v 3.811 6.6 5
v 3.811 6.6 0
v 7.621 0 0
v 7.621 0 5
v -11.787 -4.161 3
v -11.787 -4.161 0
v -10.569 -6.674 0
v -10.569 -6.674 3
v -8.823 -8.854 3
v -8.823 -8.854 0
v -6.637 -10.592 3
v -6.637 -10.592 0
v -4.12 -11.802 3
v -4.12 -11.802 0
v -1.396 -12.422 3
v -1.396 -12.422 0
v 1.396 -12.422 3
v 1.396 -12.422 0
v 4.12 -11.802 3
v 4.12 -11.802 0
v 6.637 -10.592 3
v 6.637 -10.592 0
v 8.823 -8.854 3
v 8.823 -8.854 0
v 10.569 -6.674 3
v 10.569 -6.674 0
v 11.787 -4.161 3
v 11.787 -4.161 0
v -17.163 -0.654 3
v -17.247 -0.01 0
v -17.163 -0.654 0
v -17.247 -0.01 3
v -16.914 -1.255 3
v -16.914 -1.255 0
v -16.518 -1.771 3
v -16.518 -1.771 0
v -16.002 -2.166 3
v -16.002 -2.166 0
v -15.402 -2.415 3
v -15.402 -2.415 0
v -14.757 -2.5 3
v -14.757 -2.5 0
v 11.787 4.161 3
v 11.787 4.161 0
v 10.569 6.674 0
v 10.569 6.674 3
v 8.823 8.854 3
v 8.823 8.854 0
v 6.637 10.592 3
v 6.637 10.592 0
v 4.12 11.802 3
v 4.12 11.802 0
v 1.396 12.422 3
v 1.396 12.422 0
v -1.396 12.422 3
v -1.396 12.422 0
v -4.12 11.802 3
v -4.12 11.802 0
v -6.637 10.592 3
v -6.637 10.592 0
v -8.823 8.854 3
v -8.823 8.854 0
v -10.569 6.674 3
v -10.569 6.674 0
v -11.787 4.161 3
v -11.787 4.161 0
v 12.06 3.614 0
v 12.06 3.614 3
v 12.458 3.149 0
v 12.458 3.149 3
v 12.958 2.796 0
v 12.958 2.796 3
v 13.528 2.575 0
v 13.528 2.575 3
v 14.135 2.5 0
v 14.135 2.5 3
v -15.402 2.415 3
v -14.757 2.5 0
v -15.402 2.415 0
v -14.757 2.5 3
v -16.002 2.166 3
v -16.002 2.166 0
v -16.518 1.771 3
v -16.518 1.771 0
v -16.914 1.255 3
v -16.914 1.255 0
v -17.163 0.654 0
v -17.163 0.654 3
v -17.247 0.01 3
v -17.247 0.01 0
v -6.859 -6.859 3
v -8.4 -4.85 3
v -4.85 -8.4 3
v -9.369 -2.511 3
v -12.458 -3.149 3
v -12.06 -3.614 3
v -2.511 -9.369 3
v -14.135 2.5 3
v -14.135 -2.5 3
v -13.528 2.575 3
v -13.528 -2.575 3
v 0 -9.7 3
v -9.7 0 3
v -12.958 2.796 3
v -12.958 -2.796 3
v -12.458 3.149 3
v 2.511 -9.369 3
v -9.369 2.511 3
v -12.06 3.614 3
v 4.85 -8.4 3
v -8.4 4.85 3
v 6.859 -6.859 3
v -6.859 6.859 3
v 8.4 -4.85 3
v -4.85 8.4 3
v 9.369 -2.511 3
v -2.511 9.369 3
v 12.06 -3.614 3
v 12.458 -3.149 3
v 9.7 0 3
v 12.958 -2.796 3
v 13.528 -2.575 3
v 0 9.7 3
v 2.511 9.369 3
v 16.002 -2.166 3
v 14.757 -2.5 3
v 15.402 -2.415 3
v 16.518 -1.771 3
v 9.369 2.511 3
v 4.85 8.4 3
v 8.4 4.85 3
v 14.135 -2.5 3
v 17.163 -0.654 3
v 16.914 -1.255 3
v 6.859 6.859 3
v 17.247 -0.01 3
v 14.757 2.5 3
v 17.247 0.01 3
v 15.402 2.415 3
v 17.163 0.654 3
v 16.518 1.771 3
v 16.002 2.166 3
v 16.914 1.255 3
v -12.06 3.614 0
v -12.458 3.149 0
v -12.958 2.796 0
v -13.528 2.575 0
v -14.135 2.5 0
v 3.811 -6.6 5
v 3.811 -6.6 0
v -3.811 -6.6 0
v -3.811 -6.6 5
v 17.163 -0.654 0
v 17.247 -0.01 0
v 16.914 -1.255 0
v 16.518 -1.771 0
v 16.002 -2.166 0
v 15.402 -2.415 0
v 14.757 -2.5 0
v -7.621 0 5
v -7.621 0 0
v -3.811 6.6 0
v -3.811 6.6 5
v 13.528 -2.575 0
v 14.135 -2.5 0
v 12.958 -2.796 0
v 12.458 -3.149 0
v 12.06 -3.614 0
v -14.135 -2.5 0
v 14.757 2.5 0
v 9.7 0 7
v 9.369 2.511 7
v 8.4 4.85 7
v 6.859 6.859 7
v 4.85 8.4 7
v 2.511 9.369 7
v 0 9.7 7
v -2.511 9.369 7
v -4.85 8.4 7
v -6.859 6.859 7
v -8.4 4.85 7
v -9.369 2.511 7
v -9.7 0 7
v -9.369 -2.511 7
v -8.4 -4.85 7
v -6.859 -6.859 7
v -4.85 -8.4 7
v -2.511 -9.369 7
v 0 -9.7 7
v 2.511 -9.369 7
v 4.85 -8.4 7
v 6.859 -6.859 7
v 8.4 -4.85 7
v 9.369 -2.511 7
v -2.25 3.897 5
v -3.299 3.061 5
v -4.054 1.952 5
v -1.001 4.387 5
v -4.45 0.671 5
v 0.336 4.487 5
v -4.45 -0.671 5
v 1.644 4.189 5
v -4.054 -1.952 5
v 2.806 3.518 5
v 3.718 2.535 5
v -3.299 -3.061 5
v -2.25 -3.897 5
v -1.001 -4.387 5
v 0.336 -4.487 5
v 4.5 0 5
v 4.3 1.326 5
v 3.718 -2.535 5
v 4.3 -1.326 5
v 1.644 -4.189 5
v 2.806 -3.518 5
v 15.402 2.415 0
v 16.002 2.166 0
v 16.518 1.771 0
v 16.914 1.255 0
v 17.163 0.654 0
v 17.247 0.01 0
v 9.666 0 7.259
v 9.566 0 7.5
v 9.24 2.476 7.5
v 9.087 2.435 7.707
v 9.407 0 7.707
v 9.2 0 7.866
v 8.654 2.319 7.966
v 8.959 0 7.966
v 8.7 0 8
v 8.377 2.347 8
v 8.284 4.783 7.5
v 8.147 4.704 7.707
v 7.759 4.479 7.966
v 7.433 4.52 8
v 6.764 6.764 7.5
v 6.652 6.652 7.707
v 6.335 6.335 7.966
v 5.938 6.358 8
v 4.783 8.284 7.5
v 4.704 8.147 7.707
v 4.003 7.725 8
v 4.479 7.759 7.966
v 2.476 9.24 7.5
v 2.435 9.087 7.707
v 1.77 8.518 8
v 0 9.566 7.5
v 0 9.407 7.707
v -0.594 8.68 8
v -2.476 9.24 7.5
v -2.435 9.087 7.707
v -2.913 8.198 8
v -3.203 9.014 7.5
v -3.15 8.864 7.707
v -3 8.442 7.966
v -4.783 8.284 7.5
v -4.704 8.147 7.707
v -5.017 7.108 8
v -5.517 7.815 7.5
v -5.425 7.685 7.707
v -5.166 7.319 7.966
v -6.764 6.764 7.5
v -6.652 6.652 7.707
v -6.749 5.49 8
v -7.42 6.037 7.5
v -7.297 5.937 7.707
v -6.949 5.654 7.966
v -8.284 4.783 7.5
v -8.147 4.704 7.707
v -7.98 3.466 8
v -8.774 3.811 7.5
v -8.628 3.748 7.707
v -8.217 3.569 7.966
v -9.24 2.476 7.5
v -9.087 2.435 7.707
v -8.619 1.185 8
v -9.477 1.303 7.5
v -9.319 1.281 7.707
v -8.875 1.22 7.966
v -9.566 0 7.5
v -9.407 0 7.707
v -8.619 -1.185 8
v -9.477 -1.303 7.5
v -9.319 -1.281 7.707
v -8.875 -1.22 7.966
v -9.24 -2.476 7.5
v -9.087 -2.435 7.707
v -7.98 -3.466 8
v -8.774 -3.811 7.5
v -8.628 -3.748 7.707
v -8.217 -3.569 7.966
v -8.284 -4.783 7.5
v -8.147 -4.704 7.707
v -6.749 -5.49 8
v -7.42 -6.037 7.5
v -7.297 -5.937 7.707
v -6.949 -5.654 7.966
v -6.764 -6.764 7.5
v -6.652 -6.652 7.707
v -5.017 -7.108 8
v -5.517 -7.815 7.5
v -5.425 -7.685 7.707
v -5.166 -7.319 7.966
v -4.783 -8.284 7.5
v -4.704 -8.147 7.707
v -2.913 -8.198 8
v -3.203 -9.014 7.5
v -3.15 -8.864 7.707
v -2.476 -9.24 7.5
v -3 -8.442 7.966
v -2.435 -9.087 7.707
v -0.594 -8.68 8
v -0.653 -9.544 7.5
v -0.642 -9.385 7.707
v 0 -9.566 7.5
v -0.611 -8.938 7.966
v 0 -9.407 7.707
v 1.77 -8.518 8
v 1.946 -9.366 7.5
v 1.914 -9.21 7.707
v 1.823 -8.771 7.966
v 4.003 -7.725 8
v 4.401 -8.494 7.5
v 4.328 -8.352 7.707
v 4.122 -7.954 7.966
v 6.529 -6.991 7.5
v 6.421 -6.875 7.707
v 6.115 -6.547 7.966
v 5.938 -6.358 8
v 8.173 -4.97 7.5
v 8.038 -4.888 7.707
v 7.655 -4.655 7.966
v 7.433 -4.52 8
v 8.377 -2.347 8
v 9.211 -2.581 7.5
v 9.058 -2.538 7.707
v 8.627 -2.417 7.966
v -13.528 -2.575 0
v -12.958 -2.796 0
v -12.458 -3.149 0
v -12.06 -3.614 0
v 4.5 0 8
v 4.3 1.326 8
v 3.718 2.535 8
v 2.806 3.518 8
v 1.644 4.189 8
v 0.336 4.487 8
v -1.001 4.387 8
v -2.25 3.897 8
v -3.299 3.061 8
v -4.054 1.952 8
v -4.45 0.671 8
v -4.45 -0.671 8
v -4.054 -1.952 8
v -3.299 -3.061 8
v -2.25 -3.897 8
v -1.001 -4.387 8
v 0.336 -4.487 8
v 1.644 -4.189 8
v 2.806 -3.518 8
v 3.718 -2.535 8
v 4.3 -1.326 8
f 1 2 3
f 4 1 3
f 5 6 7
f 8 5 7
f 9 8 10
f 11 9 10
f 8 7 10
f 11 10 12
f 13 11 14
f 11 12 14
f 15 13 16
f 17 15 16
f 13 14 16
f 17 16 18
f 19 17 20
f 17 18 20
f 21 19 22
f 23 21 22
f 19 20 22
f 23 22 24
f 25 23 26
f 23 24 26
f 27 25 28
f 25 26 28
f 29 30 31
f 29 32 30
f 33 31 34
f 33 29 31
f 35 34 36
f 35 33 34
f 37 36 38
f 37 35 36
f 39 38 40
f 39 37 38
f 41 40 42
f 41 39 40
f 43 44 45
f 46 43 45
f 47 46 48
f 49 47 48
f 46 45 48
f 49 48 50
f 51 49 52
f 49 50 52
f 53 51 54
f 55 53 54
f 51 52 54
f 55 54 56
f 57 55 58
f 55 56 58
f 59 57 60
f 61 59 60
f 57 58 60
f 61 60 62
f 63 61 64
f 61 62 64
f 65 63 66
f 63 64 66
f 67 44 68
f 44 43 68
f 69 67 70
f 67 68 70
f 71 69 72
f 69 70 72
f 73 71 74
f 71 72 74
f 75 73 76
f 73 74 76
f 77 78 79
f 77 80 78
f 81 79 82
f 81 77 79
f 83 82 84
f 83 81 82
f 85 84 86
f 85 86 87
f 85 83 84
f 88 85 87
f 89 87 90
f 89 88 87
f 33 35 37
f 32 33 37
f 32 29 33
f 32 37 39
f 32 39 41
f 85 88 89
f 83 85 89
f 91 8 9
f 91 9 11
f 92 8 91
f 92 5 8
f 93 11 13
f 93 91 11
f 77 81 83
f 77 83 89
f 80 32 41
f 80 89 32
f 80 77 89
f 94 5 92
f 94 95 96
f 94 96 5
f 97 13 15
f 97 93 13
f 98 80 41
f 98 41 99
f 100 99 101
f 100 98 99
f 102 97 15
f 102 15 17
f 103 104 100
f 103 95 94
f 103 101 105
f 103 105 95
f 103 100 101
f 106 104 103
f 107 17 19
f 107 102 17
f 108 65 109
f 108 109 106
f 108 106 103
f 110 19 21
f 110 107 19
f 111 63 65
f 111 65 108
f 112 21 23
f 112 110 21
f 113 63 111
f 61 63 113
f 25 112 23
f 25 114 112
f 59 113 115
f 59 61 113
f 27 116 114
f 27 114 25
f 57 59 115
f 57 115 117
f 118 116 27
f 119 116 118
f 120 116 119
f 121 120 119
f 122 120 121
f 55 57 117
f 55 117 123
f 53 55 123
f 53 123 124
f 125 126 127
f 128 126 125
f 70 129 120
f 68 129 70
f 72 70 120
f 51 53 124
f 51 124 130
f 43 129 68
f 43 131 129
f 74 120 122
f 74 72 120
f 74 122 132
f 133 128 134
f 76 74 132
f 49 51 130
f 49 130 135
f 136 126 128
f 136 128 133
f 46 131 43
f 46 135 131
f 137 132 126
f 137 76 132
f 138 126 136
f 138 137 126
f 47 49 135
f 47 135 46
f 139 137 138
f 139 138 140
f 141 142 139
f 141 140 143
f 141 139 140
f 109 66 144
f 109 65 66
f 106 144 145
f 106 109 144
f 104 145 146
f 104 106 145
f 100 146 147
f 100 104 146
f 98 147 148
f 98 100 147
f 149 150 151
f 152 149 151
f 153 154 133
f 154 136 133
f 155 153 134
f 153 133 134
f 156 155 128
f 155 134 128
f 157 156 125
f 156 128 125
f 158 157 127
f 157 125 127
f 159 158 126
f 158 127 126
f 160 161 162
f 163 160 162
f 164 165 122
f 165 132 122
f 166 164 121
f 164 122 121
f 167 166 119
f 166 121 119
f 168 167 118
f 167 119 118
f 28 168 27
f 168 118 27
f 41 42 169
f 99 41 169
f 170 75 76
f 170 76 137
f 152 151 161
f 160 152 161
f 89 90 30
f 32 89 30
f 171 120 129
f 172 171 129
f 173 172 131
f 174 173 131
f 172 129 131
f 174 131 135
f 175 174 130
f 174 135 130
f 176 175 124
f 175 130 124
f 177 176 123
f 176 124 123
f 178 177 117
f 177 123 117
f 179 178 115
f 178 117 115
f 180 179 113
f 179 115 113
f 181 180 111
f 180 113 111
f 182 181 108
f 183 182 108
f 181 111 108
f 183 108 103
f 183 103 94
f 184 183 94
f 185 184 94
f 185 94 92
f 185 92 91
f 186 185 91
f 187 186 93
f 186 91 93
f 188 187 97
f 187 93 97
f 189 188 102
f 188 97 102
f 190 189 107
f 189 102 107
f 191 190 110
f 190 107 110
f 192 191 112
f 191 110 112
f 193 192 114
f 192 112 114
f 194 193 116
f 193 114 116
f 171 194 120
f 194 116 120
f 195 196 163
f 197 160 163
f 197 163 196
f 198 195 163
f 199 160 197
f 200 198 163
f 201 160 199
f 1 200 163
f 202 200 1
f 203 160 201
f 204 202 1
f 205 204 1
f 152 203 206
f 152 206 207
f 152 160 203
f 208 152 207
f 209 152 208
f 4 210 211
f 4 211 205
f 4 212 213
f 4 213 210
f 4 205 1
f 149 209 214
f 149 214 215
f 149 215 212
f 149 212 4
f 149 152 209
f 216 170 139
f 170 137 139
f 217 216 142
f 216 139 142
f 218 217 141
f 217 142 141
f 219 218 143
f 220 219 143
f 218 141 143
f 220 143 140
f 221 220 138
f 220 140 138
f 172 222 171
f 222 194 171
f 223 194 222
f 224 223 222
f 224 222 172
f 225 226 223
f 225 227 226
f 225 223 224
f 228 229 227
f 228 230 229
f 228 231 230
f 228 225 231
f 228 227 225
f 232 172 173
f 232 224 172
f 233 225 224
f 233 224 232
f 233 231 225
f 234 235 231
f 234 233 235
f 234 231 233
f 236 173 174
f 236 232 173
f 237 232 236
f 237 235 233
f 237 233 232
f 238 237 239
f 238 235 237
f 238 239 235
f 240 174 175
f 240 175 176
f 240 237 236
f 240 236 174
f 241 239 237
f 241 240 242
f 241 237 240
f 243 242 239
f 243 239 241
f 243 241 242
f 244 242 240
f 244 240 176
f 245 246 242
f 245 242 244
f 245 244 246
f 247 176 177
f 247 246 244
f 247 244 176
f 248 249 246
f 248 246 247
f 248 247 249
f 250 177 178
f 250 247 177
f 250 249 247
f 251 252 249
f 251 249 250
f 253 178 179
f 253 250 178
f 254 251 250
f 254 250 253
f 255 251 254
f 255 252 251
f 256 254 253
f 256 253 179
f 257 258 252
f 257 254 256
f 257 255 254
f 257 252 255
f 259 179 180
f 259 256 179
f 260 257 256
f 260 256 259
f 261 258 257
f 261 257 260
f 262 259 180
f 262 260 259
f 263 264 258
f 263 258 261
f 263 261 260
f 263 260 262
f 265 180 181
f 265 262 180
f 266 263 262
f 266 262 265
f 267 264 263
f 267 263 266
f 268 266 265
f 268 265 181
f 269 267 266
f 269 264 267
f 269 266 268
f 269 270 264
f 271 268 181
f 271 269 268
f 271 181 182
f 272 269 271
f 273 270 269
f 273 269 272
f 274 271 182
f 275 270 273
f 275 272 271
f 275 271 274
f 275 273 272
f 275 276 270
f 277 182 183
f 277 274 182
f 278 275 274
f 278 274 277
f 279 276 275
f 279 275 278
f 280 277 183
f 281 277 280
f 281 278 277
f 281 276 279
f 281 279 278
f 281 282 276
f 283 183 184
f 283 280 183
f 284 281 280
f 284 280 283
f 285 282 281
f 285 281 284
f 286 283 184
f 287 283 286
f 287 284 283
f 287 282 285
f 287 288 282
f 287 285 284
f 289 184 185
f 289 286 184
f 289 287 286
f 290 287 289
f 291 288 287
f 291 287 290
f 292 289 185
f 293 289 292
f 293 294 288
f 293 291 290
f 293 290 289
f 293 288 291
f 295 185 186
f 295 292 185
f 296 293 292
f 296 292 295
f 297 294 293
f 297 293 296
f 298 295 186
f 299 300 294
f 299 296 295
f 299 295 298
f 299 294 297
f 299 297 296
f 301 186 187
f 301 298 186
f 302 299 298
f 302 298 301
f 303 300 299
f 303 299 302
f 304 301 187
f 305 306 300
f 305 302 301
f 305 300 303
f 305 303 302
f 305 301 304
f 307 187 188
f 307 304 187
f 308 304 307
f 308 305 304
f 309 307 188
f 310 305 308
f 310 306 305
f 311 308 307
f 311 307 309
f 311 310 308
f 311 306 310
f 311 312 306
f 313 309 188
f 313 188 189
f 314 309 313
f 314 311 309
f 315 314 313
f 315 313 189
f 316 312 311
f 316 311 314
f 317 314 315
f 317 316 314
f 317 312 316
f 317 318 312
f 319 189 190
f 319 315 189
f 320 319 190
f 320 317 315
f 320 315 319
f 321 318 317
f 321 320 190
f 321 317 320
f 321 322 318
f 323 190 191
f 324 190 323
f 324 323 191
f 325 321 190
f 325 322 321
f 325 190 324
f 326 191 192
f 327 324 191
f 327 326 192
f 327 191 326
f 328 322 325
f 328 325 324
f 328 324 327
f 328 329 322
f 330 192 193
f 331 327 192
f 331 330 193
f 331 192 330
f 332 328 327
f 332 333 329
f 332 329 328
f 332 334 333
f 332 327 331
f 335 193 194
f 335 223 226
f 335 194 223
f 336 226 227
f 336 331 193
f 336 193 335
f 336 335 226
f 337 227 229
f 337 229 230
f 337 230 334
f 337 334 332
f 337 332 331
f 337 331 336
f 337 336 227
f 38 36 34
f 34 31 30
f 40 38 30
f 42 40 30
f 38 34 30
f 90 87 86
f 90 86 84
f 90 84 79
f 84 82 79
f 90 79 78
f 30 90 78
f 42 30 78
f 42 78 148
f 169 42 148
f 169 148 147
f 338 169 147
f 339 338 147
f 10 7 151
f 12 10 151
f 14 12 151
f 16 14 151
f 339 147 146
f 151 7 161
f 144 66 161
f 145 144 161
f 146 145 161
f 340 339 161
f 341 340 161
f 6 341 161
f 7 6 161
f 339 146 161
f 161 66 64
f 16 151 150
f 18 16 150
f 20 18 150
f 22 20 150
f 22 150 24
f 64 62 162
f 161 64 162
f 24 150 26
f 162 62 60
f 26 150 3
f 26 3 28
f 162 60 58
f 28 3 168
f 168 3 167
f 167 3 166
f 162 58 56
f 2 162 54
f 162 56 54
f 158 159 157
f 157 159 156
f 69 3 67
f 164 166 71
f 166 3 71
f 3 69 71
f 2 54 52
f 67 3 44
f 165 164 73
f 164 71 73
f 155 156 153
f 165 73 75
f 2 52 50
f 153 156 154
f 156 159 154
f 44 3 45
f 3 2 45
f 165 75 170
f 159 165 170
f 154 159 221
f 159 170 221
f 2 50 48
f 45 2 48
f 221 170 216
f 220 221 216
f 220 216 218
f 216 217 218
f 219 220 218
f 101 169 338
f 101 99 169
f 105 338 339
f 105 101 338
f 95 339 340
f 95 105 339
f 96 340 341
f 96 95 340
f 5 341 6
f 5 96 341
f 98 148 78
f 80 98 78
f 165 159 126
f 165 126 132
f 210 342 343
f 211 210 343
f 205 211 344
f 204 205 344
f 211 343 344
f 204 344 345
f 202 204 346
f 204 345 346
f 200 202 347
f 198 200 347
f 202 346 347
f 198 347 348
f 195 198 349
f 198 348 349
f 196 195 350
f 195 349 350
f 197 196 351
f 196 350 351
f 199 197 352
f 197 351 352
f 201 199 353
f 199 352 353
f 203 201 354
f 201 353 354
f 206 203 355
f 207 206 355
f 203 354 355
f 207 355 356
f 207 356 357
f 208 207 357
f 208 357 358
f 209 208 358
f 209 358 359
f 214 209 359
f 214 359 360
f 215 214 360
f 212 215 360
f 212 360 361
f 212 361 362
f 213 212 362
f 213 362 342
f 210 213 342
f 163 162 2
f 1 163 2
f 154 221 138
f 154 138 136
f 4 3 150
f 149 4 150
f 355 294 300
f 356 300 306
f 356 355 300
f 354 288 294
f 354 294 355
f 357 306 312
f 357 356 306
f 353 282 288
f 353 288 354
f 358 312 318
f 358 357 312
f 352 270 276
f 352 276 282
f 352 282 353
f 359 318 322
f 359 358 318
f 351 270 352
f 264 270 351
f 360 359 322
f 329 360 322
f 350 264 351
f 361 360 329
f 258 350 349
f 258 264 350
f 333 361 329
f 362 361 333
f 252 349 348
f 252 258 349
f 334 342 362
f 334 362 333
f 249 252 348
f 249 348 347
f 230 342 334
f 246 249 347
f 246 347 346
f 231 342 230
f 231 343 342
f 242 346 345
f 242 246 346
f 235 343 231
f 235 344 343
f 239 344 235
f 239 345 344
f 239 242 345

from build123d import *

# Parameters (mm, degrees)
PAD_DEPTH       = 3
SKETCH001_R     = 9.7
PAD001_DEPTH    = 5
SKETCH002_R     = 4.5
POCKET_DEPTH    = 8.001
POCKET001_DEPTH = 5
FILLET_R        = 1
FILLET001_R     = 2.49


with BuildPart() as part:
    # Sketch → Pad (new body)
    with BuildSketch(Plane.XY):
        with BuildLine():
            ThreePointArc((12.247449, 2.5), (0, 12.5), (-12.247449, 2.5))
            Line((-12.247449, 2.5), (-17.247449, 2.5))
            Line((-17.247449, 2.5), (-17.247449, -2.5))
            Line((-17.247449, -2.5), (-12.247449, -2.5))
            ThreePointArc((-12.247449, -2.5), (0, -12.5), (12.247449, -2.5))
            Line((17.247449, -2.5), (12.247449, -2.5))
            Line((17.247449, 2.5), (17.247449, -2.5))
            Line((12.247449, 2.5), (17.247449, 2.5))
        make_face()
    extrude(amount=PAD_DEPTH)

    # Sketch001 → Pad001 (new body)
    with BuildSketch(Plane.XY.offset(3)):
        Circle(SKETCH001_R)
    extrude(amount=PAD001_DEPTH)

    # Sketch002 → Pocket (cut, through all)
    with BuildSketch(Plane.XY.offset(8)):
        Circle(SKETCH002_R)
    extrude(amount=-POCKET_DEPTH, mode=Mode.SUBTRACT)

    # Sketch003 → Pocket001 (cut)
    with BuildSketch(Plane(origin=(0, 0, 0), x_dir=(1, 0, 0), z_dir=(0, 0, -1))):
        Polygon((3.810512, -6.6), (7.621024, 0), (3.810512, 6.6), (-3.810512, 6.6), (-7.621024, 0), (-3.810512, -6.6), align=None)
    extrude(amount=-POCKET001_DEPTH, mode=Mode.SUBTRACT)

    # Fillet
    fillet_edges = [part.edges().sort_by_distance(p)[0] for p in [
        (-9.7, 0, 8),
    ]]
    fillet(fillet_edges, radius=FILLET_R)

    # Fillet001
    fillet001_edges = [part.edges().sort_by_distance(p)[0] for p in [
        (12.247449, 2.5, 1.5),
        (17.247449, 2.5, 1.5),
        (17.247449, -2.5, 1.5),
        (12.247449, -2.5, 1.5),
        (-12.247449, -2.5, 1.5),
        (-17.247449, -2.5, 1.5),
        (-17.247449, 2.5, 1.5),
        (-12.247449, 2.5, 1.5),
    ]]
    fillet(fillet001_edges, radius=FILLET001_R)


solid = part.part
